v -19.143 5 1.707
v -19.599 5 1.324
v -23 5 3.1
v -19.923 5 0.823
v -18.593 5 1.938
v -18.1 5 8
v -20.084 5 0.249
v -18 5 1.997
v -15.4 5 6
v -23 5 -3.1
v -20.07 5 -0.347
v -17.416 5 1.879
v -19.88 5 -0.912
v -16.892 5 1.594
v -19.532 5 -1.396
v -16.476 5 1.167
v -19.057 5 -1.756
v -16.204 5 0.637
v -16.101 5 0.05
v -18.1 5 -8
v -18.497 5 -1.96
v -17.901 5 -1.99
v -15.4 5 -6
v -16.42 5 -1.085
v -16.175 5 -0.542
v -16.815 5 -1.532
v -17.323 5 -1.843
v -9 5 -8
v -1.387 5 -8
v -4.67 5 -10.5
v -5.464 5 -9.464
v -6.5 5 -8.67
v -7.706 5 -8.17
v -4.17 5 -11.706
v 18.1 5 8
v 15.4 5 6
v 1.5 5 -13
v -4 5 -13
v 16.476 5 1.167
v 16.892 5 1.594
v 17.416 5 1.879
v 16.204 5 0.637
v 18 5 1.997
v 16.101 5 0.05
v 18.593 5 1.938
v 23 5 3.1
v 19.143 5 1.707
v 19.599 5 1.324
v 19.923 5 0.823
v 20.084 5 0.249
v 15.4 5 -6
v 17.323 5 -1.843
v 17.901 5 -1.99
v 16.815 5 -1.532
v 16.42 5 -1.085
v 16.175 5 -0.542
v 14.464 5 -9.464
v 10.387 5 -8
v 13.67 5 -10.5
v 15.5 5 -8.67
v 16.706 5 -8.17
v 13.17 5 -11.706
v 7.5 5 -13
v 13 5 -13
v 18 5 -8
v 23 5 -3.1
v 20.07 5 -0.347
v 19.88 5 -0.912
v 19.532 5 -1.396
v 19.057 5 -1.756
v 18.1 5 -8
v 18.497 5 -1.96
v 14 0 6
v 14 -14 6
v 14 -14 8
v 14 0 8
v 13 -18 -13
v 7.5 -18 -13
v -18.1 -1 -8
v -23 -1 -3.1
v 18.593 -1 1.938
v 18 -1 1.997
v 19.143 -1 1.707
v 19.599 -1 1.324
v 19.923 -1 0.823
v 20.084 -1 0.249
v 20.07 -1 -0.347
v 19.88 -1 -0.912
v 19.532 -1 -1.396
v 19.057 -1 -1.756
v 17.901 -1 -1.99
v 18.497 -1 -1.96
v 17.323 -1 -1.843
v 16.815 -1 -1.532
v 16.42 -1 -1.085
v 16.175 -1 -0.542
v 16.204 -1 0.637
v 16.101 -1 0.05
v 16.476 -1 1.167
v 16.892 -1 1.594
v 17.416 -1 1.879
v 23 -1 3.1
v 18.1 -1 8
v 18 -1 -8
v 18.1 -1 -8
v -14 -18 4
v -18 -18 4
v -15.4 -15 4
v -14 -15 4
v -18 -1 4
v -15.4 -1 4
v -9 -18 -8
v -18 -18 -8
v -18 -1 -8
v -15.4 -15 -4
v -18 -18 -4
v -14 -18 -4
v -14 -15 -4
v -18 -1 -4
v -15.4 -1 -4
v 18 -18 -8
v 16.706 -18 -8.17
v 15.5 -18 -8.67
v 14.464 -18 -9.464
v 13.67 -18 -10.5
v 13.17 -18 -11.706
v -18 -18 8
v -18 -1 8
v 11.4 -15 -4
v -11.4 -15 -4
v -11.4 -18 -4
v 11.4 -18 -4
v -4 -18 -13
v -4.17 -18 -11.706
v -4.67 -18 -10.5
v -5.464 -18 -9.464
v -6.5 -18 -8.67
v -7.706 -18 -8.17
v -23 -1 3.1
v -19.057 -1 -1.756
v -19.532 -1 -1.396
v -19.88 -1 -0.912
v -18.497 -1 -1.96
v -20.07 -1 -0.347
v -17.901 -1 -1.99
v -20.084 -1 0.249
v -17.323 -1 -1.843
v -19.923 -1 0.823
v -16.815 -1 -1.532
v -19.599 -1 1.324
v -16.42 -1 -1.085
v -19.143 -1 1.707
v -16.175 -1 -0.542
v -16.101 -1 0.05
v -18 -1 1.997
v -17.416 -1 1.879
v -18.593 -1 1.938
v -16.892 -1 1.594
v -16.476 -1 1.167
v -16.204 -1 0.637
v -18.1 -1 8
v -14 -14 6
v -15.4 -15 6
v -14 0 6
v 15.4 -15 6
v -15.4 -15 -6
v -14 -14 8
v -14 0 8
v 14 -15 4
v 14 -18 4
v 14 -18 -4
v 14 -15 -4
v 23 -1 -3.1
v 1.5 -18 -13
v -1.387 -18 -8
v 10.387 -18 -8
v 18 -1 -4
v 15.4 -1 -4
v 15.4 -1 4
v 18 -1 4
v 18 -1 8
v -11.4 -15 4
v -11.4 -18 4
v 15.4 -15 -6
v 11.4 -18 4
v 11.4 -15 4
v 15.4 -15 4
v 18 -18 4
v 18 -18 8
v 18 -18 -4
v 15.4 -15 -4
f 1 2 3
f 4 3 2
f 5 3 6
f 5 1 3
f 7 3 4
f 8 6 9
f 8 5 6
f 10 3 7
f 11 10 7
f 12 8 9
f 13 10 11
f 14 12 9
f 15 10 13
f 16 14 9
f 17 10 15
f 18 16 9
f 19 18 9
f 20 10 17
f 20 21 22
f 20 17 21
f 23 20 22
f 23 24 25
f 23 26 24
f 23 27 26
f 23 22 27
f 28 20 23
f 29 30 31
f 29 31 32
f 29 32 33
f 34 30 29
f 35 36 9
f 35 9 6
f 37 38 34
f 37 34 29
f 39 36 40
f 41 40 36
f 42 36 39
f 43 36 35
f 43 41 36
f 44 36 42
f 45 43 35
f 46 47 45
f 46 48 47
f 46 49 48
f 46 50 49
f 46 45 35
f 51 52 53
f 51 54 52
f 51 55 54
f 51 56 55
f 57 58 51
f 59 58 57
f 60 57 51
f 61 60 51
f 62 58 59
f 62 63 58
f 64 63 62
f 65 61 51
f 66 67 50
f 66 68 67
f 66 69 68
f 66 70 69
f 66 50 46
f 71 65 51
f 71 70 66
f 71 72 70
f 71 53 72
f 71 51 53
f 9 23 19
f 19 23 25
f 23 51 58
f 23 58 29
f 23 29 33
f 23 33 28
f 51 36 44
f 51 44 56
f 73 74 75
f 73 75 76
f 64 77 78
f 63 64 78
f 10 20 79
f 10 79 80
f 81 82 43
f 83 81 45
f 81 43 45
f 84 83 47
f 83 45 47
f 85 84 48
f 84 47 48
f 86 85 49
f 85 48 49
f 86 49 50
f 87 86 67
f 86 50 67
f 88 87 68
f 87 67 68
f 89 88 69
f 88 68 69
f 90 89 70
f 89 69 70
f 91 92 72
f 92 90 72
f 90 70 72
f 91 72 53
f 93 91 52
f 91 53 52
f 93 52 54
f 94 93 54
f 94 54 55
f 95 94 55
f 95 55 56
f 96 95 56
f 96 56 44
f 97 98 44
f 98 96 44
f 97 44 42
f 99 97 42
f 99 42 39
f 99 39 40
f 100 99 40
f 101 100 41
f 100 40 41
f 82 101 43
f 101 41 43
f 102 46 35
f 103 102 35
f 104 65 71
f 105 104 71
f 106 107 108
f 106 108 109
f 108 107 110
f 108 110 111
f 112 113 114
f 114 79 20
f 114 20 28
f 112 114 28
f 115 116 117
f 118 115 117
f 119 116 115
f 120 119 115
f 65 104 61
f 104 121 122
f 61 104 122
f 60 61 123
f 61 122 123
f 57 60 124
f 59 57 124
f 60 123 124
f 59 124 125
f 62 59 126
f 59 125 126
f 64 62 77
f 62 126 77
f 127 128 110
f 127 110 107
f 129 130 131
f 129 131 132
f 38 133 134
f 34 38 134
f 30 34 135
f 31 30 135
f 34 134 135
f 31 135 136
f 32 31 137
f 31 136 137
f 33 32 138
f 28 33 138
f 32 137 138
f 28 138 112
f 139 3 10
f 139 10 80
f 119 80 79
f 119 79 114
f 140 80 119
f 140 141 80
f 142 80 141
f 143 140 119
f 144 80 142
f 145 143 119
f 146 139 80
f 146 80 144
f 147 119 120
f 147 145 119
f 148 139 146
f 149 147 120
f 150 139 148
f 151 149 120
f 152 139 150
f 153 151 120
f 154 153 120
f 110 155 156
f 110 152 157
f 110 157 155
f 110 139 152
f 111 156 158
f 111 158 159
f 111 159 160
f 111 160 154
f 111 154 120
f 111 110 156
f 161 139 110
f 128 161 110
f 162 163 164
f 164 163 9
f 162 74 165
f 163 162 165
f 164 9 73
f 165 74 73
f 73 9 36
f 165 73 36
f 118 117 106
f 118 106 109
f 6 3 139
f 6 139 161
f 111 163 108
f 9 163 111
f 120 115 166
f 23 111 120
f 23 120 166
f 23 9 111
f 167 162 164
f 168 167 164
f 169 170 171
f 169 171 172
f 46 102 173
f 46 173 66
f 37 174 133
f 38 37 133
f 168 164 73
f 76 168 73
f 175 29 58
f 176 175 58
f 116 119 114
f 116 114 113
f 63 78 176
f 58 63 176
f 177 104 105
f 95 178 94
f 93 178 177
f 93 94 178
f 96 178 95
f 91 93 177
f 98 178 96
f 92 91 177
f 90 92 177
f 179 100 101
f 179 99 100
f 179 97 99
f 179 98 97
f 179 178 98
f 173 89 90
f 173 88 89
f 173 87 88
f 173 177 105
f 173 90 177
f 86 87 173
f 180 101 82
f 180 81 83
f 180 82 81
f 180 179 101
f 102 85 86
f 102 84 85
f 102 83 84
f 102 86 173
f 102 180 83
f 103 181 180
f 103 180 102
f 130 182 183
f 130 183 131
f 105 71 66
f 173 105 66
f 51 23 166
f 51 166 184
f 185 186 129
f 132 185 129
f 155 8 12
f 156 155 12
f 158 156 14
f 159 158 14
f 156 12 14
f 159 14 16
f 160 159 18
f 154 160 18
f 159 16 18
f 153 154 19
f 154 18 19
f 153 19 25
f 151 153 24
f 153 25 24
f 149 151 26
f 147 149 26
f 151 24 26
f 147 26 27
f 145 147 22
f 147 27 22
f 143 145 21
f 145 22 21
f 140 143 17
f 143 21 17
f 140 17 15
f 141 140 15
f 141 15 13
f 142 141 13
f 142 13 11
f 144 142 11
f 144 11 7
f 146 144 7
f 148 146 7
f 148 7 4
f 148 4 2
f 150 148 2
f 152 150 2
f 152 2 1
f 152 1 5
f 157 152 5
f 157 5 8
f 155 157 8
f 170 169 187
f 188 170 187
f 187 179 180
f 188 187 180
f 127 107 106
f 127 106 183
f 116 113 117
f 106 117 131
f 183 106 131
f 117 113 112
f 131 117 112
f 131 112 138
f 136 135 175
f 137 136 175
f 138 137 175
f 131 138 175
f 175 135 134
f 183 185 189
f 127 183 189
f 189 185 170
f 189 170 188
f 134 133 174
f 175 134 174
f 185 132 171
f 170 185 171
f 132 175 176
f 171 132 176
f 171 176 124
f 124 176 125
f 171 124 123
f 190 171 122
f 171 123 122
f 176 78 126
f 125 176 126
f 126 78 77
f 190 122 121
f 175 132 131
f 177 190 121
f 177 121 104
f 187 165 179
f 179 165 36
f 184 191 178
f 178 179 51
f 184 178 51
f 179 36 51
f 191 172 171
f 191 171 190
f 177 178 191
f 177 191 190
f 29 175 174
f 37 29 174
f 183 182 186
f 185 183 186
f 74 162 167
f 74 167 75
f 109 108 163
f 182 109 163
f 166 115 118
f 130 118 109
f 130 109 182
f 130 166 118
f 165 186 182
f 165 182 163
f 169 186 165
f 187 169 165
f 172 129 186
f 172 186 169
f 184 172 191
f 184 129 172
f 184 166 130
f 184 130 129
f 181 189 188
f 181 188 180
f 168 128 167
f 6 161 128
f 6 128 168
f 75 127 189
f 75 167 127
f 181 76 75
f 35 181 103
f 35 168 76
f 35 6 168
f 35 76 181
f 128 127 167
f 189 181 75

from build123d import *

# Parameters (mm, degrees)
SKETCH1_W      = 30
SKETCH1_H      = 15
SKETCH1_H_2    = 5
EXTRUDE1_DEPTH = 8
EXTRUDE2_START = 5
SKETCH2_R      = 2
SKETCH2_W      = 30.8
SKETCH2_H      = 12
SKETCH2_W_2    = 22.8
SKETCH2_H_2    = 8
EXTRUDE2_DEPTH = 20
EXTRUDE3_START = 6
SKETCH3_W      = 28
SKETCH3_H      = 14
EXTRUDE3_DEPTH = 2
SKETCH3_3_W    = 4
SKETCH3_3_H    = 17
EXTRUDE4_DEPTH = 4
EXTRUDE5_START = -15
SKETCH2_3_W    = 22.8
SKETCH2_3_H    = 8
EXTRUDE5_DEPTH = 3
EXTRUDE6_START = -18
EXTRUDE6_DEPTH = 23


with BuildPart() as part:
    # Sketch1 → Extrude1 (new, symmetric)
    with BuildSketch(Plane.XY):
        Polygon((-15, 0), (-15, 5), (-23, 5), (-23, -1), (-18, -1), (-18, -18), (18, -18), (18, -1), (23, -1), (23, 5), (15, 5), (15, 0), (15, -15), (-15, -15), align=None)
        with Locations((0, -7.5)):
            Rectangle(SKETCH1_W, SKETCH1_H)
        with Locations((0, 2.5)):
            Rectangle(SKETCH1_W, SKETCH1_H_2)
    extrude(amount=EXTRUDE1_DEPTH, both=True)

    # Sketch2 → Extrude2 (cut)
    with BuildSketch(Plane(origin=(0, 0, 0), x_dir=(1, 0, 0), z_dir=(0, 1, 0)).offset(EXTRUDE2_START)):
        Polygon((-23, -8), (-23, -3.1), (-18.1, -8), align=None)
        with Locations(Location((-18.1, 0, 0), (0, 0, 272.865983983))):
            Circle(SKETCH2_R)
        Polygon((-23, 8), (-18.1, 8), (-23, 3.1), align=None)
        Rectangle(SKETCH2_W, SKETCH2_H)
        Rectangle(SKETCH2_W_2, SKETCH2_H_2, mode=Mode.SUBTRACT)
        Rectangle(SKETCH2_W_2, SKETCH2_H_2)
        Polygon((23, 3.1), (23, 8), (18.1, 8), align=None)
        with Locations(Location((18.1, 0, 0), (0, 0, 267.134016017))):
            Circle(SKETCH2_R)
        Polygon((18.1, -8), (23, -8), (23, -3.1), align=None)
    extrude(amount=-EXTRUDE2_DEPTH, mode=Mode.SUBTRACT)

    # Sketch3 (on Front Plane) → Extrude3 (cut)
    with BuildSketch(Plane.XY.offset(EXTRUDE3_START)):
        with Locations((0, -7)):
            Rectangle(SKETCH3_W, SKETCH3_H)
    extrude(amount=EXTRUDE3_DEPTH, mode=Mode.SUBTRACT)

    # Sketch3<3> → Extrude4 (cut, symmetric)
    with BuildSketch(Plane.XY):
        with Locations((-16, -9.5)):
            Rectangle(SKETCH3_3_W, SKETCH3_3_H)
        with Locations((16, -9.5)):
            Rectangle(SKETCH3_3_W, SKETCH3_3_H)
    extrude(amount=EXTRUDE4_DEPTH, both=True, mode=Mode.SUBTRACT)

    # Sketch2<3> → Extrude5 (cut)
    with BuildSketch(Plane(origin=(0, 0, 0), x_dir=(1, 0, 0), z_dir=(0, 1, 0)).offset(EXTRUDE5_START)):
        Rectangle(SKETCH2_3_W, SKETCH2_3_H)
    extrude(amount=-EXTRUDE5_DEPTH, mode=Mode.SUBTRACT)

    # Sketch4 → Extrude6 (add)
    with BuildSketch(Plane(origin=(0, 0, 0), x_dir=(1, 0, 0), z_dir=(0, 1, 0)).offset(EXTRUDE6_START)):
        with BuildLine():
            Line((10.386751346, 8), (18, 8))
            ThreePointArc((18, 8), (14.464466094, 9.464466094), (13, 13))
            Line((13, 13), (7.5, 13))
            Line((7.5, 13), (10.386751346, 8))
        make_face()
        with BuildLine():
            Line((-9, 8), (-1.386751346, 8))
            Line((-1.386751346, 8), (1.5, 13))
            Line((1.5, 13), (-4, 13))
            ThreePointArc((-4, 13), (-5.464466094, 9.464466094), (-9, 8))
        make_face()
    extrude(amount=EXTRUDE6_DEPTH)


solid = part.part
